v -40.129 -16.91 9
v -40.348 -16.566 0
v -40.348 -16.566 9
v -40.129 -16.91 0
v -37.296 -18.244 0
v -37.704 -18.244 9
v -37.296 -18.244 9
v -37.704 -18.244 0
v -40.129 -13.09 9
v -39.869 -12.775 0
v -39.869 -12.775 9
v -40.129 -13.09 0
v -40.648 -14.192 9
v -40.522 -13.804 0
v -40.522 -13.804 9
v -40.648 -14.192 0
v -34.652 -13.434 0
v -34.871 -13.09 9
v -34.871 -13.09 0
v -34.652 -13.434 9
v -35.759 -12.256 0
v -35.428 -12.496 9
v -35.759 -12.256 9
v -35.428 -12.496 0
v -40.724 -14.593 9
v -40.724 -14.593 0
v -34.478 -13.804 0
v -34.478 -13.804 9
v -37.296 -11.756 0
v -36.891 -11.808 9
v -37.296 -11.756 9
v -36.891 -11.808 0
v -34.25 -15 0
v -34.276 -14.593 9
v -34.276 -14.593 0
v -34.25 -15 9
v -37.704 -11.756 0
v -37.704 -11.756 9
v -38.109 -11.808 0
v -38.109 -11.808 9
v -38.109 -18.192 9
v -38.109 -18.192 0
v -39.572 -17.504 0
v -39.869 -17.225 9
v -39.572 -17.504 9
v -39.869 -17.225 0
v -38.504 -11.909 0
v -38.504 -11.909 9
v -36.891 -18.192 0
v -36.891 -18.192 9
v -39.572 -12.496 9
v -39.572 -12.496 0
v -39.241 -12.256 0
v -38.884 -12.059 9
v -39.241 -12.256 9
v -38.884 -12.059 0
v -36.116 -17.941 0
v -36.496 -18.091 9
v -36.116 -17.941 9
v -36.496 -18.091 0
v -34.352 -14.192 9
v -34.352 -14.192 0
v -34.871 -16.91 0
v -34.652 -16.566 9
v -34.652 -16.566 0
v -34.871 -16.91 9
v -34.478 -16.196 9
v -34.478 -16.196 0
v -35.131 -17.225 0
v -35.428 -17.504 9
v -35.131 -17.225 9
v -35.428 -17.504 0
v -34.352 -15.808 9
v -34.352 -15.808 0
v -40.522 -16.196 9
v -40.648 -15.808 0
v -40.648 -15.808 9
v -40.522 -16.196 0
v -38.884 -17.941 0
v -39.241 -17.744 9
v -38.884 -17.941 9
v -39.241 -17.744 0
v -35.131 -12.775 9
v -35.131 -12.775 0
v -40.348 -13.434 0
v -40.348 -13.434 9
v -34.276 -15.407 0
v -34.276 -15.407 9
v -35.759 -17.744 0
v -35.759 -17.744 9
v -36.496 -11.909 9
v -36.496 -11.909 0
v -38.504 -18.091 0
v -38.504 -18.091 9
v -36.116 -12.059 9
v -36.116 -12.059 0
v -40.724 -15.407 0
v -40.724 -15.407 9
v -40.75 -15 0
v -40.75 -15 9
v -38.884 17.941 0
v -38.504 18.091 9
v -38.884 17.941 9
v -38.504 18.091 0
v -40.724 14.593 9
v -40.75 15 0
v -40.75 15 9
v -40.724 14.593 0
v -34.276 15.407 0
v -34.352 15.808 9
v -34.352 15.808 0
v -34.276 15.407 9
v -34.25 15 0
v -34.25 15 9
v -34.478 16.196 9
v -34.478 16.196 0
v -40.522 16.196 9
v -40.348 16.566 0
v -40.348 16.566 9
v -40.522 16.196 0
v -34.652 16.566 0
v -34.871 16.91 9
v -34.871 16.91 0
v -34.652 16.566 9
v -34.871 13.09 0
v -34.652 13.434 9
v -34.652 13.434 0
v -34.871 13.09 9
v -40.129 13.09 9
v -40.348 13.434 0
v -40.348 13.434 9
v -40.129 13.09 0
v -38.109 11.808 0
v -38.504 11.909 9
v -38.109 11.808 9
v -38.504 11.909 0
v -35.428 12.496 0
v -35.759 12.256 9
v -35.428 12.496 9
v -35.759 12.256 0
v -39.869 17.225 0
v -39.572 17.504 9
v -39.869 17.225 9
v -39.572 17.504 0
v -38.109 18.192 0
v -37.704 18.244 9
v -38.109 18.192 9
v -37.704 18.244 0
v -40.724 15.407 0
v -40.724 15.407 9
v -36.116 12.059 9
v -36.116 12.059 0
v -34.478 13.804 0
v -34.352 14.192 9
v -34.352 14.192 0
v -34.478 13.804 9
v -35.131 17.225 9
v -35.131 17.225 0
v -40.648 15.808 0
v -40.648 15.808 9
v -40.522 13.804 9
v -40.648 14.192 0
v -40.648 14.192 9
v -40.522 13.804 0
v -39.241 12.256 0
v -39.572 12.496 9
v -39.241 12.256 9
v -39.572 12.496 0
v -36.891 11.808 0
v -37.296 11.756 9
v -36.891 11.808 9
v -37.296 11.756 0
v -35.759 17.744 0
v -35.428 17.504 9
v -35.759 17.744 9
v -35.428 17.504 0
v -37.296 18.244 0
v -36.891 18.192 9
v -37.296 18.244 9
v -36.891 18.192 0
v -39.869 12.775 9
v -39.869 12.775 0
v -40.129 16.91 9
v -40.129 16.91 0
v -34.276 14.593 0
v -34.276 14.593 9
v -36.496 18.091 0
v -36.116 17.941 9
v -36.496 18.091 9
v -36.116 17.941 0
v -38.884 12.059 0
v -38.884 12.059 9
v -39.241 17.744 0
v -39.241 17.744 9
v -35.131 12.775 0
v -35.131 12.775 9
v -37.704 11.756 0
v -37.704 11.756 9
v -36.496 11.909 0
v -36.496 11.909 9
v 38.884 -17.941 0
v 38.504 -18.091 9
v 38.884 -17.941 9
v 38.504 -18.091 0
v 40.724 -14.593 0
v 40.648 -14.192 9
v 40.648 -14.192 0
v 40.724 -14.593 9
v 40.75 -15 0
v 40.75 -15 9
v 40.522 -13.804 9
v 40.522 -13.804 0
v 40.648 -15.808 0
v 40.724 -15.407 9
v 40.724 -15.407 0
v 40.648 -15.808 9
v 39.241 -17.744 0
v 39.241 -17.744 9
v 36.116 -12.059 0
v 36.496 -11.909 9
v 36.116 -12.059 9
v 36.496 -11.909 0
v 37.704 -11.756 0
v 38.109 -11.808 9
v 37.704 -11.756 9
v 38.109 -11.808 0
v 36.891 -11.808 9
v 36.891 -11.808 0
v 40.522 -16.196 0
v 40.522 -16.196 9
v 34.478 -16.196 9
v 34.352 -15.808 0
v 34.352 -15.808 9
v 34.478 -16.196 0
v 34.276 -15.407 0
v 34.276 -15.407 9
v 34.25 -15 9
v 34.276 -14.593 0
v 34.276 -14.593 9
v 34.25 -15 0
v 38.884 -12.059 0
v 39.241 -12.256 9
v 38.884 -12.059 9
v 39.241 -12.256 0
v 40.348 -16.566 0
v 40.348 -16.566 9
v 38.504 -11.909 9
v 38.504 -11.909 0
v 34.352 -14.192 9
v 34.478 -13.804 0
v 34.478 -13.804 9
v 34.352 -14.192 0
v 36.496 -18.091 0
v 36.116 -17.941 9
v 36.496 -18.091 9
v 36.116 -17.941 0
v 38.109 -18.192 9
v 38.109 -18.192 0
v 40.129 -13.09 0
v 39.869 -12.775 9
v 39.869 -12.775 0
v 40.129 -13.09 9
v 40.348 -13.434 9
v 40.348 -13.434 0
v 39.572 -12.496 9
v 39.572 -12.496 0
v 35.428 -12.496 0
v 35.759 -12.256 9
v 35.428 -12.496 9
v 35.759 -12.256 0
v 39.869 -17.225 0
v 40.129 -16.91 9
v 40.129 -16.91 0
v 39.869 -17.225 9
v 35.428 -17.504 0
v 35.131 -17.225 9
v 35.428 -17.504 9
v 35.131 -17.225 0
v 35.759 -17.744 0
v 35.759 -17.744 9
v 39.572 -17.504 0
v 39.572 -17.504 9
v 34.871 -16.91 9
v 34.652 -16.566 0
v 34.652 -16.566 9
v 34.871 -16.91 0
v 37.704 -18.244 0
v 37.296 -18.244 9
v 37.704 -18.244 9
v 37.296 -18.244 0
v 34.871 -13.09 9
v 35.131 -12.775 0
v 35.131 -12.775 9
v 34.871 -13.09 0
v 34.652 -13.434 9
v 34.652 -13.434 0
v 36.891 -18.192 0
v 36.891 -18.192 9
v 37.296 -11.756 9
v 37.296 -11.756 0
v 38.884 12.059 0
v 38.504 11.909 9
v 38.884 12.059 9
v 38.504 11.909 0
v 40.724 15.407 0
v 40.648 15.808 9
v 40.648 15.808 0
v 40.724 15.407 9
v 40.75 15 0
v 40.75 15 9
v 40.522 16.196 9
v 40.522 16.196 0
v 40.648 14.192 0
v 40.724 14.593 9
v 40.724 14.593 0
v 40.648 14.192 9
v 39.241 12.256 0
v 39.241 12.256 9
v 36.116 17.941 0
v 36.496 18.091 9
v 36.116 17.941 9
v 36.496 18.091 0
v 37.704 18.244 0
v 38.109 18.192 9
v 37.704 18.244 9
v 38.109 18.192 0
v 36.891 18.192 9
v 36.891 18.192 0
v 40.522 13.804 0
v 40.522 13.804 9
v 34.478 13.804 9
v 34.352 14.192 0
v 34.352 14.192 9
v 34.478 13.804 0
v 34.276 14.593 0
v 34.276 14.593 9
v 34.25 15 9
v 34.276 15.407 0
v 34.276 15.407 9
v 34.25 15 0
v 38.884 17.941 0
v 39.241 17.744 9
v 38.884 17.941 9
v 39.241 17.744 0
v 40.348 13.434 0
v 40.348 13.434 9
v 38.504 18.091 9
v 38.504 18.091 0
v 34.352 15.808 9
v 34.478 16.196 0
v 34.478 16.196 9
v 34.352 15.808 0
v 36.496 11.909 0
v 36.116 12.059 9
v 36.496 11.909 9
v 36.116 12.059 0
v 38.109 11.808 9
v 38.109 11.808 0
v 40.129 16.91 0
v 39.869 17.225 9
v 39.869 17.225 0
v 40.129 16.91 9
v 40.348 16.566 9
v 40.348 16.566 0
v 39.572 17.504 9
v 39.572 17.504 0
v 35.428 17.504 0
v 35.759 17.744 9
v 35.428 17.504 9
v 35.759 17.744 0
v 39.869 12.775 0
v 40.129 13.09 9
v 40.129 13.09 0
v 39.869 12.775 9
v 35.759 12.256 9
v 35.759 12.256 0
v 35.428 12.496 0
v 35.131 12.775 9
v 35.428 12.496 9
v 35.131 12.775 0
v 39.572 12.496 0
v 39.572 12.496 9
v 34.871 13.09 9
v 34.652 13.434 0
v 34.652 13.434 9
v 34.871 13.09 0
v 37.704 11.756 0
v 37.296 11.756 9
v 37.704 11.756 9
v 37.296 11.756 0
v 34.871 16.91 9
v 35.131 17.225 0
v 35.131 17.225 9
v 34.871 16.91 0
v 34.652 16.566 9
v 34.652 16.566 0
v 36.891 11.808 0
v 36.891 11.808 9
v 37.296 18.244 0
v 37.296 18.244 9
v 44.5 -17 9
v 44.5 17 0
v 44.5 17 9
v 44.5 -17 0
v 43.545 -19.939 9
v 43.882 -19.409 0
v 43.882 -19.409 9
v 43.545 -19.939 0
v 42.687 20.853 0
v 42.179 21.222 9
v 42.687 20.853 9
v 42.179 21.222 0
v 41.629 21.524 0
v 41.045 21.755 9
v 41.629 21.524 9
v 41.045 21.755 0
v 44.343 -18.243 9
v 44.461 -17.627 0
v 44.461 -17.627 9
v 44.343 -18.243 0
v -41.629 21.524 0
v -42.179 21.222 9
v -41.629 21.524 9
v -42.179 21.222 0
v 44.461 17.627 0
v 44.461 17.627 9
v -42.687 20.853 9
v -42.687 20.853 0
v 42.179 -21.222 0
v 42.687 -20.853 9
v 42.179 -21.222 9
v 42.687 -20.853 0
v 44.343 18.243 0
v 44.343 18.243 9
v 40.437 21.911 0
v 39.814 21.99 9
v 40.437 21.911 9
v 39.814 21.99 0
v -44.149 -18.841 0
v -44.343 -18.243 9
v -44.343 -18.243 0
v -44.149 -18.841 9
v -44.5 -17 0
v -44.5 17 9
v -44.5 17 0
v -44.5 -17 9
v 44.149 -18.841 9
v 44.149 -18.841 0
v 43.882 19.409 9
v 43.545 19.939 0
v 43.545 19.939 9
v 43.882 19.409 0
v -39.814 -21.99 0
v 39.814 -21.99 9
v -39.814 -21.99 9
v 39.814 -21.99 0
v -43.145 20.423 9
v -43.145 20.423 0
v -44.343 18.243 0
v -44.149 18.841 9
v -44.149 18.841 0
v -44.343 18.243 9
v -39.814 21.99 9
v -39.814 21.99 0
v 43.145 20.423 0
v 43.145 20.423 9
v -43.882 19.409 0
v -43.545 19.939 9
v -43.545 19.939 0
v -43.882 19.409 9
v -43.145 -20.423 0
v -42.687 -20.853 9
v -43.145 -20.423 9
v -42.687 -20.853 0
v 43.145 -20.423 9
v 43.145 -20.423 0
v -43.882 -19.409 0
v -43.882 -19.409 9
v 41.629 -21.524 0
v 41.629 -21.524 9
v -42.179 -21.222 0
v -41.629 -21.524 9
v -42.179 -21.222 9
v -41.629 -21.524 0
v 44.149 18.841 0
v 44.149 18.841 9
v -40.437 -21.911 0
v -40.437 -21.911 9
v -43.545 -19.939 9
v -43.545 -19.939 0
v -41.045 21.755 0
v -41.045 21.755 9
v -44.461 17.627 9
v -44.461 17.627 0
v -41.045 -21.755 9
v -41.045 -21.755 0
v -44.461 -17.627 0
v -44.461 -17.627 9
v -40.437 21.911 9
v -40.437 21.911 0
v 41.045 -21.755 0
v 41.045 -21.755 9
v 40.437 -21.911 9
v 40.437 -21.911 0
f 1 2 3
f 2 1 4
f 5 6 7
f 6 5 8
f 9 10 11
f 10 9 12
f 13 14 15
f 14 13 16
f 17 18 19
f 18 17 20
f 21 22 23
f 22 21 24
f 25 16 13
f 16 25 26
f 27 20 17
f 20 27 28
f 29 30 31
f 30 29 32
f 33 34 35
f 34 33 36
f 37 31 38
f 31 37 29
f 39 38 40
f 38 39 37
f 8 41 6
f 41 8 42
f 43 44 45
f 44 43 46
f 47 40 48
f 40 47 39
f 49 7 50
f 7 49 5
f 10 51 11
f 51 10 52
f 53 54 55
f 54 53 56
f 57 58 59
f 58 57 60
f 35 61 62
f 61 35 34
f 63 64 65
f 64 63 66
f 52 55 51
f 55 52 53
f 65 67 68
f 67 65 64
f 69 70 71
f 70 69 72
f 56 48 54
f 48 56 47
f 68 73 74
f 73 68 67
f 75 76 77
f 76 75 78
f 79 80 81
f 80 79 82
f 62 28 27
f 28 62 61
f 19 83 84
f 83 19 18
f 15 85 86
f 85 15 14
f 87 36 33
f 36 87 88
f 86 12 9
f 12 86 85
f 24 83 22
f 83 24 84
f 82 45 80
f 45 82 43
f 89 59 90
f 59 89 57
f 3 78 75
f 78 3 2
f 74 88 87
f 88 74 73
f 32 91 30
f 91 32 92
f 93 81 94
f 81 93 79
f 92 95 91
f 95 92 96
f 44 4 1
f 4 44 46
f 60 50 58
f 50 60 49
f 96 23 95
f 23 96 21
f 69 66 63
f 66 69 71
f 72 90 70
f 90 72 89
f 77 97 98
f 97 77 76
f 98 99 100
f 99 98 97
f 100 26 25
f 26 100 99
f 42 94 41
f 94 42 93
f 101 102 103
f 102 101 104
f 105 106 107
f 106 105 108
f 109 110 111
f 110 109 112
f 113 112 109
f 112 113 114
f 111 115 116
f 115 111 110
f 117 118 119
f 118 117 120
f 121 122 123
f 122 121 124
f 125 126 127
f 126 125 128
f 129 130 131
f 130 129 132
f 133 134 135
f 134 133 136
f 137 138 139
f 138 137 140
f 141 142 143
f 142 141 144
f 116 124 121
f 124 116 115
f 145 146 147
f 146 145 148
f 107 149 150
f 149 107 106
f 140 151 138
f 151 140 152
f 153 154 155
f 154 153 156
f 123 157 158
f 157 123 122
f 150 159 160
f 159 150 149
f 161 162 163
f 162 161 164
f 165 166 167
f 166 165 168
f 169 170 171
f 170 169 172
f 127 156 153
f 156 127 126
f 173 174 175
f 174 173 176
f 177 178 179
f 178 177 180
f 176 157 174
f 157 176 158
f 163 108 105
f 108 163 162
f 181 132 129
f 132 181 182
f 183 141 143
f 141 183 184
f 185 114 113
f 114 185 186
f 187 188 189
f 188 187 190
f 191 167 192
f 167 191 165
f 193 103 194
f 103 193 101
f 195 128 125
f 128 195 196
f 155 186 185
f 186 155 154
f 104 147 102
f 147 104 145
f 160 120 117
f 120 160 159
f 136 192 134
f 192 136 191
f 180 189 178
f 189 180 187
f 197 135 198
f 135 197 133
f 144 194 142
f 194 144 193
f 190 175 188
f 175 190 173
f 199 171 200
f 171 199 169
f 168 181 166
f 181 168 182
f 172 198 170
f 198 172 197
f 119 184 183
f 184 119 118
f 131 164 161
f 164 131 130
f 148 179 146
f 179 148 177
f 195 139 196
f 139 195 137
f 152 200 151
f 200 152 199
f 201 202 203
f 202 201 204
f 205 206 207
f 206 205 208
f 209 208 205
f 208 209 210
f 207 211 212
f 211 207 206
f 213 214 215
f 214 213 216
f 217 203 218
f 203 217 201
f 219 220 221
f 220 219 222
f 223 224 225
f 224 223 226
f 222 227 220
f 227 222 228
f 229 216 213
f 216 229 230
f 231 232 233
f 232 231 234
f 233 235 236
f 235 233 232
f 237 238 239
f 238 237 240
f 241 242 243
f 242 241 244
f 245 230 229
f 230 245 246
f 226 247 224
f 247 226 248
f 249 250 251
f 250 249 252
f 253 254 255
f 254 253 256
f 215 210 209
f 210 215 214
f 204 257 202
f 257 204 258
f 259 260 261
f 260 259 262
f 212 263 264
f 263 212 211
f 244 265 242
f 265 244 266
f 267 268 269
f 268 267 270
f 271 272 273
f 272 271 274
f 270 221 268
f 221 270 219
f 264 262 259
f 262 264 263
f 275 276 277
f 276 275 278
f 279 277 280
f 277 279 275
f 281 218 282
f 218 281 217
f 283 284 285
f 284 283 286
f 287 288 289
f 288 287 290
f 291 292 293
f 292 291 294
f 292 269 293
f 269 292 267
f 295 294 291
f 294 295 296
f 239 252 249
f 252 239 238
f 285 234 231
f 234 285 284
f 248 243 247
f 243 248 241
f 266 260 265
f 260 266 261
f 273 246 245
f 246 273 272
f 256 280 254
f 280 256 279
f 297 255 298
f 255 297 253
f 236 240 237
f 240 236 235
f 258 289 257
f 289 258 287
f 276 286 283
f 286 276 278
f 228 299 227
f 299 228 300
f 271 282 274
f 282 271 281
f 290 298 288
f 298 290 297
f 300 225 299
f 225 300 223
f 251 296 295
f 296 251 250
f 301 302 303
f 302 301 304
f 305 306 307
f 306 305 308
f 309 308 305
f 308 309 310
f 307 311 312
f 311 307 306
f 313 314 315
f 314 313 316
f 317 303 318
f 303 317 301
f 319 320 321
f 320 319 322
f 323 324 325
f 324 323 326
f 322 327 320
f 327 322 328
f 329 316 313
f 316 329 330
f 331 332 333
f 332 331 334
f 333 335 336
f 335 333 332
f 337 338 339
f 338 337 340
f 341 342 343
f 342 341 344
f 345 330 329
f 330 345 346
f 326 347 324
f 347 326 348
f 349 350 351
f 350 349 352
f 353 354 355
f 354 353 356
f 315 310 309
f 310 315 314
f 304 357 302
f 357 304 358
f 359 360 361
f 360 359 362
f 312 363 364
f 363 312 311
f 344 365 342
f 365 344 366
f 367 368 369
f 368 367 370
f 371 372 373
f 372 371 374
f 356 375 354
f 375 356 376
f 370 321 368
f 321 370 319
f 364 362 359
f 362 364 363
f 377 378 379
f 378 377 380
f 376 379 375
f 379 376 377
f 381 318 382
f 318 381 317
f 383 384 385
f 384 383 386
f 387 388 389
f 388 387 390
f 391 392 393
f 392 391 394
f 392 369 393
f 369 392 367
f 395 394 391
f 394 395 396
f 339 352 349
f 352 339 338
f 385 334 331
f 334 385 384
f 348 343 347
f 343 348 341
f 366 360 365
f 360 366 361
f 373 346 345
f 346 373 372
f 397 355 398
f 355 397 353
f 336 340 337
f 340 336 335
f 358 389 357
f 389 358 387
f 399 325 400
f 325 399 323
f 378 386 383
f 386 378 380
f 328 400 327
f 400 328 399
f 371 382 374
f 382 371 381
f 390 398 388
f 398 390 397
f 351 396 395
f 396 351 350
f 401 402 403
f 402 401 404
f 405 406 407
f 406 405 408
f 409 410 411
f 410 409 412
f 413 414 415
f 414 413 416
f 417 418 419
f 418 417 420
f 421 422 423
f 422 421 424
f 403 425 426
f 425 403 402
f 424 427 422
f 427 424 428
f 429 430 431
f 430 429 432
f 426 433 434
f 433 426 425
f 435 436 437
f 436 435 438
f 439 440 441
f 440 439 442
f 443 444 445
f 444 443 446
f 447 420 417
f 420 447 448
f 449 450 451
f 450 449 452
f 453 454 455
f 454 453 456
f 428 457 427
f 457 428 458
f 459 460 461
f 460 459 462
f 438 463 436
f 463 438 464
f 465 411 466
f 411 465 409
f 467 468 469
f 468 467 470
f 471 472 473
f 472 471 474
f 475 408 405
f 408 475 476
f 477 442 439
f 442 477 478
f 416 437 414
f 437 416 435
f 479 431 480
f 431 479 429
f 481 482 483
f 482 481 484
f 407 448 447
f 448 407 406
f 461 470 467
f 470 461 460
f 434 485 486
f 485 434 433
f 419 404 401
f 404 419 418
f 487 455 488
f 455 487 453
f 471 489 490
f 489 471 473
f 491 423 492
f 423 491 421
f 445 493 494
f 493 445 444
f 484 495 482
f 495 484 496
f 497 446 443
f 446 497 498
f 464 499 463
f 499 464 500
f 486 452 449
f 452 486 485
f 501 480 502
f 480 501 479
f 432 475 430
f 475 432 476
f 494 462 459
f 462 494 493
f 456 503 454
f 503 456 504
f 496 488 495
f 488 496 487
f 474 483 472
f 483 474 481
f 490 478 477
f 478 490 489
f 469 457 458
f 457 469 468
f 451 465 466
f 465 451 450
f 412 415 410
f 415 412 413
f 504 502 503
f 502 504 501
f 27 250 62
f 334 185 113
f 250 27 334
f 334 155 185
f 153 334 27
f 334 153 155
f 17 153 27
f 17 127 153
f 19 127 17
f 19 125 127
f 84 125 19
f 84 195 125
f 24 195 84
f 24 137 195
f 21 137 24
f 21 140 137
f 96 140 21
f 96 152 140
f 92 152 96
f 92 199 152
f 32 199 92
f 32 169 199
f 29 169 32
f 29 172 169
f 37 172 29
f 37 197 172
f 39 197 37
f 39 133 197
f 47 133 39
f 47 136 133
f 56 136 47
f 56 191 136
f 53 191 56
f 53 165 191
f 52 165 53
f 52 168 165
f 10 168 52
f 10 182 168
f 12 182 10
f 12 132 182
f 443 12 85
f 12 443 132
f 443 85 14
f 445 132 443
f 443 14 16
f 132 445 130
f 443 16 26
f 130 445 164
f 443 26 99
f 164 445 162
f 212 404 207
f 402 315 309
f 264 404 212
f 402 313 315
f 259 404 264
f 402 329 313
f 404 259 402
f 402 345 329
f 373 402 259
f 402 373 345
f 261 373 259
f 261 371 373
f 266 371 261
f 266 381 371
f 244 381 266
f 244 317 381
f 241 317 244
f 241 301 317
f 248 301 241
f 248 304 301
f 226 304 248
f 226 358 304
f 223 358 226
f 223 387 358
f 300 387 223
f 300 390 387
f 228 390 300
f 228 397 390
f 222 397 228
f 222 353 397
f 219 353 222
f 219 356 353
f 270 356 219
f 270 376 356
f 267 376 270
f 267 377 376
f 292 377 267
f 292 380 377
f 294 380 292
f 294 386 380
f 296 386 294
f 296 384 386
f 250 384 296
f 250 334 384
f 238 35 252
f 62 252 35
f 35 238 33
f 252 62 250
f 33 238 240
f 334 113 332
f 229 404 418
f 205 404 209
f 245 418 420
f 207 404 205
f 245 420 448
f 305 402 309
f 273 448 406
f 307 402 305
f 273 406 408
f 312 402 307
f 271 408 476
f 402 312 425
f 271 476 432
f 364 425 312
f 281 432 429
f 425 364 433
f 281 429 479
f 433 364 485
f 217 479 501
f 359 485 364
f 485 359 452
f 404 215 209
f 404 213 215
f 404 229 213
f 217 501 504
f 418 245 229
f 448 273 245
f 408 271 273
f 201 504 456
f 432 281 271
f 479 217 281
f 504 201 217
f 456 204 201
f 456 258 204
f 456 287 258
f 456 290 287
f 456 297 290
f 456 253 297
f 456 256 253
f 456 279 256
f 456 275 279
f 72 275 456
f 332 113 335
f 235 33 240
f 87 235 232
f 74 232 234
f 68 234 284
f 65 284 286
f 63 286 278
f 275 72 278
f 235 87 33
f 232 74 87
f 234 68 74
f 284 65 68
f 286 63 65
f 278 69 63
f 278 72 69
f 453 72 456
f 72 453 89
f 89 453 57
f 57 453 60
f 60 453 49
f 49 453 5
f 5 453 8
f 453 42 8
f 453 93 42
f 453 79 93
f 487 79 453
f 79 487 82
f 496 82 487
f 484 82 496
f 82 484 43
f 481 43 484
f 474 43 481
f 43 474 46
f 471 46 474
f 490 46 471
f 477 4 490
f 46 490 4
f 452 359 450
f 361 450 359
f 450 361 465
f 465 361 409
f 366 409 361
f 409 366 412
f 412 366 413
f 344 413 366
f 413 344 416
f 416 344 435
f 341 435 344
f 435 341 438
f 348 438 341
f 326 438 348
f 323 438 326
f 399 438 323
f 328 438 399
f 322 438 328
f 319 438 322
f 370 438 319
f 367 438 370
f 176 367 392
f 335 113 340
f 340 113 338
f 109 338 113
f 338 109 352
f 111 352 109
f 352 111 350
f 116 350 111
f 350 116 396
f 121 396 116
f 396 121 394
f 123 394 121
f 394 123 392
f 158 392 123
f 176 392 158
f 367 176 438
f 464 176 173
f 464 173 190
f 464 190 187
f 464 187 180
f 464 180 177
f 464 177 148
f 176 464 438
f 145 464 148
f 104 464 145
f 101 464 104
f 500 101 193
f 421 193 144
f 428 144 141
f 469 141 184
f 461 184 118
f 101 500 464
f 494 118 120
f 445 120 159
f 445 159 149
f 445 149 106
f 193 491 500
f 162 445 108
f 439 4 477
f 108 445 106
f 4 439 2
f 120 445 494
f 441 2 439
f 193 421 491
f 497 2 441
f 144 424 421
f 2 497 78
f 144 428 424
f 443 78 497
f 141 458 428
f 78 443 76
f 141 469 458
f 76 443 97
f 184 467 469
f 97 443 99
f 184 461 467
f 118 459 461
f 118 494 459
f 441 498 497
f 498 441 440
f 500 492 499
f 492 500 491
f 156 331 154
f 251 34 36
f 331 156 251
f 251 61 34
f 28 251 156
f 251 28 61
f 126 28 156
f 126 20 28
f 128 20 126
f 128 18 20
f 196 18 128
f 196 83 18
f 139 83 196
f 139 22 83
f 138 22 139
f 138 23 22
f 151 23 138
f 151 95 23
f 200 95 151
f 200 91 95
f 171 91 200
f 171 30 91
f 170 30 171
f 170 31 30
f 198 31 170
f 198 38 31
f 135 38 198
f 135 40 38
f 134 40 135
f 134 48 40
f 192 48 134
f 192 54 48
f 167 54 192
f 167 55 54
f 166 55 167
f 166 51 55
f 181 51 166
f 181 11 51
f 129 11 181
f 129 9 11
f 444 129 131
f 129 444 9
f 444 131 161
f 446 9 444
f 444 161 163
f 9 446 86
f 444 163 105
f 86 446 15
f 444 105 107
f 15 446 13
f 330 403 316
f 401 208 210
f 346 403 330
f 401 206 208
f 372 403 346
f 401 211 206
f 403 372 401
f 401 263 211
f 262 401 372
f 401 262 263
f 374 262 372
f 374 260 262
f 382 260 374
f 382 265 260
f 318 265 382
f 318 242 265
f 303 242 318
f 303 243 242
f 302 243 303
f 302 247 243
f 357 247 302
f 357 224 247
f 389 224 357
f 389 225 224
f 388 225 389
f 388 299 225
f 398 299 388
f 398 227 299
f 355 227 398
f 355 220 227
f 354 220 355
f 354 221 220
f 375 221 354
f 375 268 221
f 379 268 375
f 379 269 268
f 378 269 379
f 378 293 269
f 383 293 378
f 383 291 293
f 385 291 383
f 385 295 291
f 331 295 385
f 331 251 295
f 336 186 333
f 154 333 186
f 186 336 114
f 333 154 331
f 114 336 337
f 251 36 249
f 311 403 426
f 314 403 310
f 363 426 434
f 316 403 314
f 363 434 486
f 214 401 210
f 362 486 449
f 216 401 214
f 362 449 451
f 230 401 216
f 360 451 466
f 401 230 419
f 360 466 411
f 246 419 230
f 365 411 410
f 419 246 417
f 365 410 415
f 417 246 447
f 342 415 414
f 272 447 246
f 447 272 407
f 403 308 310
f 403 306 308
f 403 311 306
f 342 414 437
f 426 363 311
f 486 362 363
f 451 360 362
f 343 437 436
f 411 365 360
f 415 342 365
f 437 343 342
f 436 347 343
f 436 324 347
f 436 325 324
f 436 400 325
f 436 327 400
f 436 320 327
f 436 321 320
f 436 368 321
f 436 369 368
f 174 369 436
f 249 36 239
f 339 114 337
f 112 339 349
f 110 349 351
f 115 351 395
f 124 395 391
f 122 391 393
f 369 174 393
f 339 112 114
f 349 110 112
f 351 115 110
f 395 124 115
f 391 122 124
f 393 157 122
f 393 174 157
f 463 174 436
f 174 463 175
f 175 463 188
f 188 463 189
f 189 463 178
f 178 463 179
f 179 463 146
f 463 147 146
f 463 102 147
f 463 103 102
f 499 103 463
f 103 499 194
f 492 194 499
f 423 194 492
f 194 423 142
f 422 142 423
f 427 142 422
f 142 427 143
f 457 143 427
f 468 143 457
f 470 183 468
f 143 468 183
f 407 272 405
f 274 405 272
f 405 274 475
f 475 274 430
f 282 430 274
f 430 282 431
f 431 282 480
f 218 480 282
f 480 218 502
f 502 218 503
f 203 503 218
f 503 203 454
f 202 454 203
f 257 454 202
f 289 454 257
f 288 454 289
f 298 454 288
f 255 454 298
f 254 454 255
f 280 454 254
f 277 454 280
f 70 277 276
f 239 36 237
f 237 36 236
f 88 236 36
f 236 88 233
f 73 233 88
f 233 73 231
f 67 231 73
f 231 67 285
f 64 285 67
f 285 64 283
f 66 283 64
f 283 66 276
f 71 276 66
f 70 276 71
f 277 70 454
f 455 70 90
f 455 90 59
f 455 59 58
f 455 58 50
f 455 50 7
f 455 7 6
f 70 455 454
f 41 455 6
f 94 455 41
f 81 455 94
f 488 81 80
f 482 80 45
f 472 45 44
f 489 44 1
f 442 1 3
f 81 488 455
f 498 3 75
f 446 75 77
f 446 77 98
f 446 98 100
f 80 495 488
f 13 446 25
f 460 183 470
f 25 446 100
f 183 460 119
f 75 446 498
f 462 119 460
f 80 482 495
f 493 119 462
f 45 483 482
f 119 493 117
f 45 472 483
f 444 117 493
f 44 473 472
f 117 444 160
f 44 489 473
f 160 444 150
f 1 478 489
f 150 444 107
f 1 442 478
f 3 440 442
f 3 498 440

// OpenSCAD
$fn = 50;


difference() {
	union() {
		hull() {
			translate(v = [-39.5000000000, 17.0000000000, 0]) {
				cylinder(h = 9, r = 5);
			}
			translate(v = [39.5000000000, 17.0000000000, 0]) {
				cylinder(h = 9, r = 5);
			}
			translate(v = [-39.5000000000, -17.0000000000, 0]) {
				cylinder(h = 9, r = 5);
			}
			translate(v = [39.5000000000, -17.0000000000, 0]) {
				cylinder(h = 9, r = 5);
			}
		}
	}
	union() {
		translate(v = [-37.5000000000, -15.0000000000, -100.0000000000]) {
			cylinder(h = 200, r = 3.2500000000);
		}
		translate(v = [-37.5000000000, 15.0000000000, -100.0000000000]) {
			cylinder(h = 200, r = 3.2500000000);
		}
		translate(v = [37.5000000000, -15.0000000000, -100.0000000000]) {
			cylinder(h = 200, r = 3.2500000000);
		}
		translate(v = [37.5000000000, 15.0000000000, -100.0000000000]) {
			cylinder(h = 200, r = 3.2500000000);
		}
	}
}
